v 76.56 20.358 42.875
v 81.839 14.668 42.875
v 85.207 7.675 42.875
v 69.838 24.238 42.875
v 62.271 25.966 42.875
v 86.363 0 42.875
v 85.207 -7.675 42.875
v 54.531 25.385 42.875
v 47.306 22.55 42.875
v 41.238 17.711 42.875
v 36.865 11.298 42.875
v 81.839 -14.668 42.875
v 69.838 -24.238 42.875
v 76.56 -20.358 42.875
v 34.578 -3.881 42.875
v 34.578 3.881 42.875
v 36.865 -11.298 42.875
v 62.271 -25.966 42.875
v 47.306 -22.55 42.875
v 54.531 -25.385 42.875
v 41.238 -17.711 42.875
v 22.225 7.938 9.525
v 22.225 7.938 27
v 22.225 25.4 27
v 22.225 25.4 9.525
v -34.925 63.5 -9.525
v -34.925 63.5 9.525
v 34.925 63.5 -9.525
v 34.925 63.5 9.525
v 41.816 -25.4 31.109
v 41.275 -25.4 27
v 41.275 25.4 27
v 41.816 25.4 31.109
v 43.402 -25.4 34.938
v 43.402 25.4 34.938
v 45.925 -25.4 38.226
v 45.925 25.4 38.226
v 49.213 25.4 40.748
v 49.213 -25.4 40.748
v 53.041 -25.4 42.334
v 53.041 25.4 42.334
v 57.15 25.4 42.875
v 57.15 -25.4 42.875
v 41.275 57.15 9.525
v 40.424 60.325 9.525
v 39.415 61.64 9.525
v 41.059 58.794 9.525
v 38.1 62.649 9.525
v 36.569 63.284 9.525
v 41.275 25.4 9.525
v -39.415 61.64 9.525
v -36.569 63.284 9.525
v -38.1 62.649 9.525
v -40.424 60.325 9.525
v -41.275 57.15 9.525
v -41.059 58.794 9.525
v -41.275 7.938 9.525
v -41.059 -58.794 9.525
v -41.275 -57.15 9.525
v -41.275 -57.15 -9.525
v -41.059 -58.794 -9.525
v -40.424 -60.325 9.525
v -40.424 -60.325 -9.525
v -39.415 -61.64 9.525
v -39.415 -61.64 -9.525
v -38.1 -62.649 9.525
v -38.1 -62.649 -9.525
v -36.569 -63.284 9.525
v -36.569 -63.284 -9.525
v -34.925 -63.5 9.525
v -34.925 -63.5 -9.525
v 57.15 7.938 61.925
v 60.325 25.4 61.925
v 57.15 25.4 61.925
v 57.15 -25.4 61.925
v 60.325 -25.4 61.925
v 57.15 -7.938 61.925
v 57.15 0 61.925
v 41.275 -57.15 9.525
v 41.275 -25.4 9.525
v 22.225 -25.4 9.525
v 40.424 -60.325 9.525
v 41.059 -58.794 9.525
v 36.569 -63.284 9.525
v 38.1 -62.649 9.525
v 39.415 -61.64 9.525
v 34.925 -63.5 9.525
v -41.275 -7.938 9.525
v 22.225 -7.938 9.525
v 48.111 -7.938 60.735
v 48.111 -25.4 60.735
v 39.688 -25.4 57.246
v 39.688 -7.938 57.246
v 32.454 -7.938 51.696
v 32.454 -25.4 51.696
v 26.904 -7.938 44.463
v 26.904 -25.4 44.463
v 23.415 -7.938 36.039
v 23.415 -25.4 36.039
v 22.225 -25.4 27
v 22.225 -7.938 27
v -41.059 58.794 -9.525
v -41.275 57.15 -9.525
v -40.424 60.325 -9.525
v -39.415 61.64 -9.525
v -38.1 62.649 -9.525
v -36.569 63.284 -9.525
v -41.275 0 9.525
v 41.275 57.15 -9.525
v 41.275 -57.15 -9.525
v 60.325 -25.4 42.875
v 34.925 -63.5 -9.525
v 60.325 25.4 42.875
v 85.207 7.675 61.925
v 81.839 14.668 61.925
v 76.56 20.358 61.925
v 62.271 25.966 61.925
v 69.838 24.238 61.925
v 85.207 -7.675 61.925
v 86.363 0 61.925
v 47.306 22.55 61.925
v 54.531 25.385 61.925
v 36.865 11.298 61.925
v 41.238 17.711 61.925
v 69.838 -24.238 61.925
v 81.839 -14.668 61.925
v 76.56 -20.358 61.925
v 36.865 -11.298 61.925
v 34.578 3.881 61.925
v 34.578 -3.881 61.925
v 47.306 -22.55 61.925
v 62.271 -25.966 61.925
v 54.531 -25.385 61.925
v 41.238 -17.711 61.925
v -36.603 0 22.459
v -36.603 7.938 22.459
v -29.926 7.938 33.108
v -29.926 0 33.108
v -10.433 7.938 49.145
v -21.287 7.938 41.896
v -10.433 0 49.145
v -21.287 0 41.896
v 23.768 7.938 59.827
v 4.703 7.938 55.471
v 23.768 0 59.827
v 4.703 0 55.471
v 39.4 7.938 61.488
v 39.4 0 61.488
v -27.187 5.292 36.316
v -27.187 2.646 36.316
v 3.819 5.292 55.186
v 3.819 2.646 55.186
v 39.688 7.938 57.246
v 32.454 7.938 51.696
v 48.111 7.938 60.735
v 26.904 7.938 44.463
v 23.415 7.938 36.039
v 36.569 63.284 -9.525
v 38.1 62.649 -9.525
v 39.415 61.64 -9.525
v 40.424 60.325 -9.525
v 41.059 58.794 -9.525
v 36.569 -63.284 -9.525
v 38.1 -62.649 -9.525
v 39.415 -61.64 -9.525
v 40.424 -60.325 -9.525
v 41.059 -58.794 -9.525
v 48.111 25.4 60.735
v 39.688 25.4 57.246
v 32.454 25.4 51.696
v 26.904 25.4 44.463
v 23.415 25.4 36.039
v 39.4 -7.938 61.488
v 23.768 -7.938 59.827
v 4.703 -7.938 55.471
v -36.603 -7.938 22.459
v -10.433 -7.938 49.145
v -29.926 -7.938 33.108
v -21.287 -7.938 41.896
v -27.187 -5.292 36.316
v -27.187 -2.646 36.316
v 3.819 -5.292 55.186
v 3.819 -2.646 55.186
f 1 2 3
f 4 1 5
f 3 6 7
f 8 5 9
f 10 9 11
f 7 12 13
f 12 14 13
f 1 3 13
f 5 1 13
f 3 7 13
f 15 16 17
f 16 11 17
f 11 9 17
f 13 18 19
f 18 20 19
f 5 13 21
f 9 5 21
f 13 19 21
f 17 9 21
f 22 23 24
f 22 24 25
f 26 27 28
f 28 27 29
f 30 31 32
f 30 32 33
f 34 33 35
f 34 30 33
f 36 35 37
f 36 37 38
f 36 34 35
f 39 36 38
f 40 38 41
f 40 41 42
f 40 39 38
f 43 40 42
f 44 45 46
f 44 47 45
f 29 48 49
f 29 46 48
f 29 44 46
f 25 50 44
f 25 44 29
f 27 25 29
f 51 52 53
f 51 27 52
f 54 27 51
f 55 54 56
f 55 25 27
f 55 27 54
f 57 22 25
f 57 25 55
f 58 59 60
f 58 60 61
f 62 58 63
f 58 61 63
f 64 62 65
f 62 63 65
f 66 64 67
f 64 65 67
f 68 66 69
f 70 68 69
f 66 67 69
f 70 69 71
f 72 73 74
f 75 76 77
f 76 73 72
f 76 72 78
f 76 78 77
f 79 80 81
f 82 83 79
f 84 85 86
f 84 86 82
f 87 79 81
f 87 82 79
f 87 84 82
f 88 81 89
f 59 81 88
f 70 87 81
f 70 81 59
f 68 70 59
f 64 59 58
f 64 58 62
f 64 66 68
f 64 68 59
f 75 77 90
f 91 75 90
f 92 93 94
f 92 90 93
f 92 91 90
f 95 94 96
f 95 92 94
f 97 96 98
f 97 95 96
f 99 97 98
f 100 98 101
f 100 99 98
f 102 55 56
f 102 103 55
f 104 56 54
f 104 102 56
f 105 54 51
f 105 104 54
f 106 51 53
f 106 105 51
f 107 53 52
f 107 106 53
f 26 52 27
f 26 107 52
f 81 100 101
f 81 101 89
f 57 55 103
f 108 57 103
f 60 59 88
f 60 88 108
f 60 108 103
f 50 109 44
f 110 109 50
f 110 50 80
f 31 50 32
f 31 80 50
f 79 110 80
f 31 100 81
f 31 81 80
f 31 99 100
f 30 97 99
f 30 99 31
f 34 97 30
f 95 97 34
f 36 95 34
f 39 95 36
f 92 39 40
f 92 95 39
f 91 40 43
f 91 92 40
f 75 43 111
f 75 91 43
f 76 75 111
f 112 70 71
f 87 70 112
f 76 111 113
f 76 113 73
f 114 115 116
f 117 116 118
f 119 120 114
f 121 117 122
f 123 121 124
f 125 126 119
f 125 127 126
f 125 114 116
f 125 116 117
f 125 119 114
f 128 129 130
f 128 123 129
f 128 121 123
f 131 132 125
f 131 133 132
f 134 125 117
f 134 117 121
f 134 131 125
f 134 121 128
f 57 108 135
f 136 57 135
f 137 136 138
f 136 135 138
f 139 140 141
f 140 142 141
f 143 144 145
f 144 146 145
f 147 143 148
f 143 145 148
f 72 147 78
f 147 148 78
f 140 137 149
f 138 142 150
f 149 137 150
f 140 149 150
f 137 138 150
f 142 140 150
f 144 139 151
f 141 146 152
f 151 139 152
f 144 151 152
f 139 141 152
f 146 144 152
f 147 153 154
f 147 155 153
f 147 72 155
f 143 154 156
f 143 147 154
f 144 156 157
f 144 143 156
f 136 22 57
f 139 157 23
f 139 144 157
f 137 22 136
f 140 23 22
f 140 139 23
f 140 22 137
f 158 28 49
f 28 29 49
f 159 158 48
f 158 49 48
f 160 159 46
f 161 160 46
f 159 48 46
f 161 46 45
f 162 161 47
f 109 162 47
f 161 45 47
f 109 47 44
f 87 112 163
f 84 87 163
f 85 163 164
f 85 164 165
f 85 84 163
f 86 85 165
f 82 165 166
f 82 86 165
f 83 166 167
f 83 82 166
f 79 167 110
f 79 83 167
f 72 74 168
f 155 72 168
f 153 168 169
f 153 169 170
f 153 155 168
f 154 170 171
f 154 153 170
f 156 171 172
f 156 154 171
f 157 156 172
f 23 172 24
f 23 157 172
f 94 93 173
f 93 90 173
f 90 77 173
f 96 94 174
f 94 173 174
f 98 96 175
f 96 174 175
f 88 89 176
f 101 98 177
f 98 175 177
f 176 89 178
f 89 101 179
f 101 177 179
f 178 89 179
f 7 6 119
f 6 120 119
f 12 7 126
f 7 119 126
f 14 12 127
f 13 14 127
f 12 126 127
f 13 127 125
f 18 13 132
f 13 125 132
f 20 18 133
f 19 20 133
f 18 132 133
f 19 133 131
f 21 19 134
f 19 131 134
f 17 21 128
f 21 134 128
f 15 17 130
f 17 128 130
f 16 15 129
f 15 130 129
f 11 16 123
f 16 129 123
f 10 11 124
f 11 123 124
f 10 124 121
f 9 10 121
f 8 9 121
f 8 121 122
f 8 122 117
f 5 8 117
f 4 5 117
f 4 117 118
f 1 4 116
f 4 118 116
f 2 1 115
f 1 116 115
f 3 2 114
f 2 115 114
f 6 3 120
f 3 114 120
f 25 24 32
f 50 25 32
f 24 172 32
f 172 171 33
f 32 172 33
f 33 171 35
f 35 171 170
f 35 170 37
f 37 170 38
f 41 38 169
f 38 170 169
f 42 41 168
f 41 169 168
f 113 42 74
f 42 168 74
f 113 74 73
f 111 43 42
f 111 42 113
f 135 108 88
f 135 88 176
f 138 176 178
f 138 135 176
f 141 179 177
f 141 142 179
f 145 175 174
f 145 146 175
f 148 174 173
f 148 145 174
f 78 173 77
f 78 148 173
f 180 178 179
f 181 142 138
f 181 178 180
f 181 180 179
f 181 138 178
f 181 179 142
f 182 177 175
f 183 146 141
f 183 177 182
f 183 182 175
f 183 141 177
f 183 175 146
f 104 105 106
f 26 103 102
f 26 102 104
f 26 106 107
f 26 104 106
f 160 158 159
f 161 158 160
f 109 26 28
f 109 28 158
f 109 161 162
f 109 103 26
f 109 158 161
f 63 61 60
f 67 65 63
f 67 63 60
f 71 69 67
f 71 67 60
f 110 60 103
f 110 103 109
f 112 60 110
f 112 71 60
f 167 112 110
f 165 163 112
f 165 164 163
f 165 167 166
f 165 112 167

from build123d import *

# Parameters (mm, degrees)
F1_DEPTH = 63.5
F2_DEPTH = 25.4
F3_DEPTH = 7.9375
F0_W     = 26.0383098787
F0_H     = 19.05
F5_R     = 6.35


with BuildPart() as f1:
    # F0 (on Front) → F1 (new body, symmetric)
    with BuildSketch(Plane.XZ):
        Polygon((22.225, 9.525), (-41.275, 9.525), (-41.275, -9.525), (41.275, -9.525), (41.275, 9.525), align=None)
    extrude(amount=F1_DEPTH, both=True)

    # F0 (on Front) → F2 (join, symmetric)
    with BuildSketch(Plane.XZ):
        with BuildLine():
            Line((22.225, 27.0002), (22.225, 9.525))
            Line((22.225, 9.525), (41.275, 9.525))
            Line((41.275, 9.525), (41.275, 27.0002))
            ThreePointArc((41.275, 27.0002), (45.9246798487, 38.2255201513), (57.15, 42.8752))
            Line((57.15, 42.8752), (60.325, 42.8752))
            Line((60.325, 42.8752), (60.325, 61.9252))
            Line((60.325, 61.9252), (57.15, 61.9252))
            ThreePointArc((57.15, 61.9252), (32.4542956671, 51.6959043329), (22.225, 27.0002))
        make_face()
    extrude(amount=F2_DEPTH, both=True)

    # F0 (on Front) → F3 (join, symmetric)
    with BuildSketch(Plane.XZ):
        with BuildLine():
            add(Edge.make_bspline(
                [(-41.275, 9.525), (-33.8429920375, 38.8737134635), (-9.1467518359, 62.6552775502), (57.15, 61.9252)],
                knots=[0, 0, 0, 0, 111.5045361635, 111.5045361635, 111.5045361635, 111.5045361635], degree=3))
            Line((-41.275, 9.525), (22.225, 9.525))
            Line((22.225, 9.525), (22.225, 27.0002))
            ThreePointArc((22.225, 27.0002), (32.4542956671, 51.6959043329), (57.15, 61.9252))
        make_face()
    extrude(amount=F3_DEPTH, both=True)

    # F5
    f5_edges = [f1.edges().sort_by_distance(p)[0] for p in [
        (-41.275, -63.5, 0),
        (41.275, -63.5, 0),
        (41.275, 63.5, 0),
        (-41.275, 63.5, 0),
    ]]
    fillet(f5_edges, radius=F5_R)


with BuildPart() as f4:
    # F0 (on Front) → F4 (revolve)
    with BuildSketch(Plane.XZ):
        with Locations((73.3441549394, 52.4002)):
            Rectangle(F0_W, F0_H)
    revolve(axis=Axis((60.325, 0, 52.3875), (0, 0, -1)))


solid = Compound([f1.part, f4.part])
